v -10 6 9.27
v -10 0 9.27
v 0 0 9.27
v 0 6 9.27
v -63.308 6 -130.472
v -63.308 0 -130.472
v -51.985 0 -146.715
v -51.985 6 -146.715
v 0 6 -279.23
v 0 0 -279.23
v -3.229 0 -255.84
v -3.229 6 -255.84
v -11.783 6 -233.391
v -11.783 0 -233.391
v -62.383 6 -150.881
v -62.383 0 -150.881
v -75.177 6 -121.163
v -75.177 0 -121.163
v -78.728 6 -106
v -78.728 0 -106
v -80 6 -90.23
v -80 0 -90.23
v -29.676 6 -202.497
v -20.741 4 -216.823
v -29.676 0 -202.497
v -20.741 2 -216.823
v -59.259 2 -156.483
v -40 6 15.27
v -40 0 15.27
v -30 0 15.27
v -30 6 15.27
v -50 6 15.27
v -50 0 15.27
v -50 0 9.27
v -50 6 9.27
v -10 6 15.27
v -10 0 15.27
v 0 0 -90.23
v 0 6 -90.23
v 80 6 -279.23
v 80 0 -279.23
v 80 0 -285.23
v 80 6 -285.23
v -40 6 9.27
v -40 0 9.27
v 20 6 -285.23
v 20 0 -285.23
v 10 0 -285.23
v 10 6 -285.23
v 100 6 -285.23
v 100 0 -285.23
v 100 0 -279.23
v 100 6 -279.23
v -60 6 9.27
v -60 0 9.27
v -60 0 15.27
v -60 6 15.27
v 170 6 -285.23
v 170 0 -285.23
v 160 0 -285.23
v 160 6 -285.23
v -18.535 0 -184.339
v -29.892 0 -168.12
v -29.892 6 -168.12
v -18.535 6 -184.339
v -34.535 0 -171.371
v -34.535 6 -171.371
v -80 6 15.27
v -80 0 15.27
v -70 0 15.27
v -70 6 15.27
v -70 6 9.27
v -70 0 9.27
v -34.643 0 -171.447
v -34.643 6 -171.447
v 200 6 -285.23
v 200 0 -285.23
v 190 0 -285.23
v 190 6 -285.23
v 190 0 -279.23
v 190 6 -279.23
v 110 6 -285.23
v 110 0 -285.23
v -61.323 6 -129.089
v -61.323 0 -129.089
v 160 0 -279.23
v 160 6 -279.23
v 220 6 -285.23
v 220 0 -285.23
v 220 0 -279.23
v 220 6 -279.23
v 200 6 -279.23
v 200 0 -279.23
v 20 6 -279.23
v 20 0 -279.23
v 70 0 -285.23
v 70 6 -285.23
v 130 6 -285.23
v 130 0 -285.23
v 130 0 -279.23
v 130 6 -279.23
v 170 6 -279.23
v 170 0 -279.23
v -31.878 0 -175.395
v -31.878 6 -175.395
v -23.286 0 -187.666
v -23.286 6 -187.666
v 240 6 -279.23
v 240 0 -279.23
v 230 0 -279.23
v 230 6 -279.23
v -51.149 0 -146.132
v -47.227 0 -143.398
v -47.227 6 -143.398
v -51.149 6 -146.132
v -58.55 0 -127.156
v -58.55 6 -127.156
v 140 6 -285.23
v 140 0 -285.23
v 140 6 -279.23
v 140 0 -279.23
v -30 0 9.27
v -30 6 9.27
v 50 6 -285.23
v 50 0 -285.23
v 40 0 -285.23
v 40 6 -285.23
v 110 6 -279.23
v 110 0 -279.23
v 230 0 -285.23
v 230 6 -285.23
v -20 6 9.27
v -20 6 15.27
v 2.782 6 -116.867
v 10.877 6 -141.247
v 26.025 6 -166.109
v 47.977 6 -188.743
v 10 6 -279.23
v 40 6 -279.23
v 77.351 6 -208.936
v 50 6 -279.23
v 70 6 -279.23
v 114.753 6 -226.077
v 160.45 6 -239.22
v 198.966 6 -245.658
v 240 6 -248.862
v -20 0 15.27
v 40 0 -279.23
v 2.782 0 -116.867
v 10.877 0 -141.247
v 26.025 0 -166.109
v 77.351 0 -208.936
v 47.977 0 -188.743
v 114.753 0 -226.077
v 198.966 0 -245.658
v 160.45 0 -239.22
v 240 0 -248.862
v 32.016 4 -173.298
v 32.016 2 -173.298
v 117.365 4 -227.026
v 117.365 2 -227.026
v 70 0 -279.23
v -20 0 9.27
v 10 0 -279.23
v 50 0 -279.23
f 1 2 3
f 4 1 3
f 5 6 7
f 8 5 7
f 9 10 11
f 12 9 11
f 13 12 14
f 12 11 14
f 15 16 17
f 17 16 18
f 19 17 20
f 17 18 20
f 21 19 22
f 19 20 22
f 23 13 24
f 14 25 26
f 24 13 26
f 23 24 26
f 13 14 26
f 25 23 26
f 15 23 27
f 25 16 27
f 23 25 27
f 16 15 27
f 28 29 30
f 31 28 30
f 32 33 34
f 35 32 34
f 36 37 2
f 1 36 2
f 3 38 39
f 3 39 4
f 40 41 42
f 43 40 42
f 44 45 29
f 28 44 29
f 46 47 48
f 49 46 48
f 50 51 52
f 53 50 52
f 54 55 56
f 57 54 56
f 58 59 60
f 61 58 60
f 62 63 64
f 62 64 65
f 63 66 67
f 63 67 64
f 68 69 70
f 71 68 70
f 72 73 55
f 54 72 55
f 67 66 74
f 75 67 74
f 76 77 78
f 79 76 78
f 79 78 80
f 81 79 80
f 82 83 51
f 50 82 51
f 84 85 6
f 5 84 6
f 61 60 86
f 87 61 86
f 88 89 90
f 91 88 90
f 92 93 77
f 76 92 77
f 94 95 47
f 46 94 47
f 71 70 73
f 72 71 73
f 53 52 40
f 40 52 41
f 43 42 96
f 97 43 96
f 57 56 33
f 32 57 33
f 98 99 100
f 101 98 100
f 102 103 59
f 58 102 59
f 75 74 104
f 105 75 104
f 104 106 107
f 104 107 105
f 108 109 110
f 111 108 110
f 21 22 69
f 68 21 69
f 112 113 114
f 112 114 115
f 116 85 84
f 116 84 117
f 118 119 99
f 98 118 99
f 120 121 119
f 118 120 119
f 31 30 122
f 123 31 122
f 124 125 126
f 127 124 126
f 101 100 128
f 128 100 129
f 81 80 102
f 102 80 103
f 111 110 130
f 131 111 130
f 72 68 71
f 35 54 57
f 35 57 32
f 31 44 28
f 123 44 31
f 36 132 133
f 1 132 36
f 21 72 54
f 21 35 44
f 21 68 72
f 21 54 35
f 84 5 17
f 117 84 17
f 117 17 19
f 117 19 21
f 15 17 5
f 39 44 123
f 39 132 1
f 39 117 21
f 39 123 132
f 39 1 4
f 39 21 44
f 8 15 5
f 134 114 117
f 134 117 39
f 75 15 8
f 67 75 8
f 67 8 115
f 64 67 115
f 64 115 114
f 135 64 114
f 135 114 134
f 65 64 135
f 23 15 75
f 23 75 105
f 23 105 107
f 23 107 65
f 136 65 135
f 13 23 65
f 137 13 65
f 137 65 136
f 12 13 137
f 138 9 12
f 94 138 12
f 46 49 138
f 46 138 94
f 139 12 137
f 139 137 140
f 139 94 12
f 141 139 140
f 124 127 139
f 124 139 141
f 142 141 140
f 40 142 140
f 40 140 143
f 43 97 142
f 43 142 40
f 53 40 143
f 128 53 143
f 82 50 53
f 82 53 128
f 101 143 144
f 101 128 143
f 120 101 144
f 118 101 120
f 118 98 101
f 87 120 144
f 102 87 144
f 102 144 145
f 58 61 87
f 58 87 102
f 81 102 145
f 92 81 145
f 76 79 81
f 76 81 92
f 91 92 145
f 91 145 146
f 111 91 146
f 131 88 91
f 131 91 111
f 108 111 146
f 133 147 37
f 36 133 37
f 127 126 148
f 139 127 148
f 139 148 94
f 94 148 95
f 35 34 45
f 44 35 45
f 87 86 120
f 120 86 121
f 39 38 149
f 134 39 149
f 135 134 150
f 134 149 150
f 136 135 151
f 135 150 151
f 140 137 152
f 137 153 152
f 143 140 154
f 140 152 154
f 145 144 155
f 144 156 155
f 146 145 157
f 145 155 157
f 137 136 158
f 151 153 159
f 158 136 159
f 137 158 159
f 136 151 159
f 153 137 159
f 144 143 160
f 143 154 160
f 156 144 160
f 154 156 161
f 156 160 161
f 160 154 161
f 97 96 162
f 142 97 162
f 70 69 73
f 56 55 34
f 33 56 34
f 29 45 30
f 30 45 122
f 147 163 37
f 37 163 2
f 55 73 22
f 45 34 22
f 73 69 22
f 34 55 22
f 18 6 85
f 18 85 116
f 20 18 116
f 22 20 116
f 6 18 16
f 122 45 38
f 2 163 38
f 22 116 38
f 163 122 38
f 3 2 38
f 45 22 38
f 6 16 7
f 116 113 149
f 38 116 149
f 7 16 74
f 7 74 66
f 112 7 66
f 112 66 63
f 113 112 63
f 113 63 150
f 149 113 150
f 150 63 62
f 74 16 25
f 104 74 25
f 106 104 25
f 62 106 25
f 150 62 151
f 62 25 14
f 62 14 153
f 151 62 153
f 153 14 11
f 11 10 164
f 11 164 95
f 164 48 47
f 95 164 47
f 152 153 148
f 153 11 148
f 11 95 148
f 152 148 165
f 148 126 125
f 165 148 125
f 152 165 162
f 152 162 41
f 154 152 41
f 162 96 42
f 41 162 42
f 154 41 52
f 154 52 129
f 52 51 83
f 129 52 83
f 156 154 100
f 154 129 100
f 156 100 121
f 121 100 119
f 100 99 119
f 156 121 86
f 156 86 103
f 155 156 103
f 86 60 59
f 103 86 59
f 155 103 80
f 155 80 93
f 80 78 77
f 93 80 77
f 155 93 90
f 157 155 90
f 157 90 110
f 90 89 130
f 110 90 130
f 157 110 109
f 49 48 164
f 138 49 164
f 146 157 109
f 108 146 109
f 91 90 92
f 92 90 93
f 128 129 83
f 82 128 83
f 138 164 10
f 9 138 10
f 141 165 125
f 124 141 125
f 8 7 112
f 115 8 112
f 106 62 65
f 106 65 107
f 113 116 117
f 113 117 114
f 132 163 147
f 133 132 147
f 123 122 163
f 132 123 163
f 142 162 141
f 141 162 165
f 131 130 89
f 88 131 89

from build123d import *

# Parameters (mm, degrees)
BOSS_EXTRUDE1_DEPTH = 6
SKETCH2_W           = 10
SKETCH2_H           = 6
BOSS_EXTRUDE2_DEPTH = 6
SKETCH3_W           = 10
SKETCH3_H           = 6
BOSS_EXTRUDE3_DEPTH = 6
SKETCH4_W           = 20
SKETCH4_H           = 30.367424907
CUT_EXTRUDE1_DEPTH  = 6
CUT_EXTRUDE2_DEPTH  = 355.990492973
FLEX1_DEPTH         = 6
FLEX1_2_DEPTH       = 6


# Read off the part's stored shape, not the designer's step: Flex1
with BuildPart() as part:
    # Sketch1 → Boss-Extrude1 (new body)
    with BuildSketch(Plane(origin=(0, 0, 0), x_dir=(1, 0, 0), z_dir=(0, 1, 0))):
        with BuildLine():
            Line((0, 0), (0, 66.5))
            add(Edge.make_bspline(
                [(0, 66.5), (0, 168.087947667), (114.415275211, 225.5), (260, 225.5)],
                knots=[0, 0, 0, 0, 1, 1, 1, 1], degree=3))
            Line((260, 225.5), (260, 255.5))
            Line((260, 255.5), (0, 255.5))
            add(Edge.make_bspline(
                [(-80, 66.5), (-80, 138.367791909), (0, 189.401588521), (0, 255.5)],
                knots=[0, 0, 0, 0, 1, 1, 1, 1], degree=3))
            Line((-80, 66.5), (-80, 0))
            Line((-80, 0), (0, 0))
        make_face()
    extrude(amount=BOSS_EXTRUDE1_DEPTH)

    # Sketch2 → Boss-Extrude2 (add)
    with BuildSketch(Plane(origin=(0, 6, 0), x_dir=(1, 0, 0), z_dir=(0, 1, 0))):
        with Locations((-35, -3)):
            Rectangle(SKETCH2_W, SKETCH2_H)
        with Locations((-15, -3)):
            Rectangle(SKETCH2_W, SKETCH2_H)
        with Locations((-55, -3)):
            Rectangle(SKETCH2_W, SKETCH2_H)
        with Locations((-75, -3)):
            Rectangle(SKETCH2_W, SKETCH2_H)
    extrude(amount=-BOSS_EXTRUDE2_DEPTH)

    # Sketch3 → Boss-Extrude3 (add)
    with BuildSketch(Plane(origin=(0, 6, 0), x_dir=(1, 0, 0), z_dir=(0, 1, 0))):
        with Locations((195, 258.5)):
            Rectangle(SKETCH3_W, SKETCH3_H)
        with Locations((225, 258.5)):
            Rectangle(SKETCH3_W, SKETCH3_H)
        with Locations((165, 258.5)):
            Rectangle(SKETCH3_W, SKETCH3_H)
        with Locations((135, 258.5)):
            Rectangle(SKETCH3_W, SKETCH3_H)
        with Locations((105, 258.5)):
            Rectangle(SKETCH3_W, SKETCH3_H)
        with Locations((75, 258.5)):
            Rectangle(SKETCH3_W, SKETCH3_H)
        with Locations((45, 258.5)):
            Rectangle(SKETCH3_W, SKETCH3_H)
        with Locations((15, 258.5)):
            Rectangle(SKETCH3_W, SKETCH3_H)
    extrude(amount=-BOSS_EXTRUDE3_DEPTH)

    # Sketch4 → Cut-Extrude1 (cut)
    with BuildSketch(Plane(origin=(0, 6, 0), x_dir=(1, 0, 0), z_dir=(0, 1, 0))):
        with Locations((250, 240.316287547)):
            Rectangle(SKETCH4_W, SKETCH4_H)
    extrude(amount=-CUT_EXTRUDE1_DEPTH, mode=Mode.SUBTRACT)

    # Sketch5 → Cut-Extrude2 (cut, through all)
    with BuildSketch(Plane(origin=(0, 6, 0), x_dir=(1, 0, 0), z_dir=(0, 1, 0))):
        Polygon((-29.891687561, 144.39007032), (-34.642769417, 147.71681365), (-23.285955978, 163.936024127), (-18.534874121, 160.609280796), align=None)
        Polygon((-58.550195169, 103.425626242), (-63.308179345, 106.742490211), (-51.985092004, 122.985263776), (-47.227107828, 119.668399807), align=None)
    extrude(amount=-CUT_EXTRUDE2_DEPTH, mode=Mode.SUBTRACT)

    # Flex1 outline → Flex1 (cut)
    with BuildSketch(Plane(origin=(0, 0, 0), x_dir=(1, 0, 0), z_dir=(0, 1, 0))):
        with BuildLine():
            add(Edge.make_bspline(
                [(0, 90.229900389), (0, 187.117415556), (104.072328665, 243.822461296), (240.00000001, 248.862475483)],
                knots=[0, 0, 0, 0, 0.953730412, 0.953730412, 0.953730412, 0.953730412], degree=3))
            Line((0, 90.229900389), (0, 66.5))
            add(Edge.make_bspline(
                [(0, 66.5), (0, 163.387515167), (104.072328665, 220.092560907), (240.00000001, 225.132575093)],
                knots=[0, 0, 0, 0, 0.953730412, 0.953730412, 0.953730412, 0.953730412], degree=3))
            Line((240.00000001, 225.132575093), (240.00000001, 248.862475483))
        make_face()
        with BuildLine():
            add(Edge.make_bspline(
                [(-51.148803226, 146.132174392), (-54.710438553, 140.513781755), (-58.143911828, 134.842056067), (-61.323392575, 129.088765208)],
                knots=[0.594014657, 0.594014657, 0.594014657, 0.594014657, 0.686318961, 0.686318961, 0.686318961, 0.686318961], degree=3))
            Line((-61.323392575, 129.088765208), (-58.550195169, 127.155526632))
            Line((-58.550195169, 127.155526632), (-47.227107828, 143.398300196))
            Line((-47.227107828, 143.398300196), (-51.148803226, 146.132174392))
        make_face()
        with BuildLine():
            add(Edge.make_bspline(
                [(-31.878447999, 175.394574164), (-32.758957733, 174.05373382), (-33.644948776, 172.71267215), (-34.534615872, 171.370984112)],
                knots=[0.431899292, 0.431899292, 0.431899292, 0.431899292, 0.454328108, 0.454328108, 0.454328108, 0.454328108], degree=3))
            Line((-34.534615872, 171.370984112), (-29.891687561, 168.119970709))
            Line((-29.891687561, 168.119970709), (-18.534874121, 184.339181186))
            Line((-18.534874121, 184.339181186), (-23.285955978, 187.665924517))
            Line((-23.285955978, 187.665924517), (-31.878447999, 175.394574164))
        make_face()
    extrude(amount=FLEX1_DEPTH, mode=Mode.SUBTRACT)

    # Flex1 2 outline → Flex1 2 (add)
    with BuildSketch(Plane(origin=(0, 0, 0), x_dir=(1, 0, 0), z_dir=(0, 1, 0))):
        with BuildLine():
            Line((230, 255.5), (240, 255.5))
            Line((240, 255.5), (240, 279.229900389))
            Line((240, 279.229900389), (230, 279.229900389))
            Line((230, 279.229900389), (230, 285.229900389))
            Line((230, 285.229900389), (220, 285.229900389))
            Line((220, 285.229900389), (220, 279.229900389))
            Line((220, 279.229900389), (200, 279.229900389))
            Line((200, 279.229900389), (200, 285.229900389))
            Line((200, 285.229900389), (190, 285.229900389))
            Line((190, 285.229900389), (190, 279.229900389))
            Line((190, 279.229900389), (170, 279.229900389))
            Line((170, 279.229900389), (170, 285.229900389))
            Line((170, 285.229900389), (160, 285.229900389))
            Line((160, 285.229900389), (160, 279.229900389))
            Line((160, 279.229900389), (140, 279.229900389))
            Line((140, 279.229900389), (140, 285.229900389))
            Line((140, 285.229900389), (130, 285.229900389))
            Line((130, 285.229900389), (130, 279.229900389))
            Line((130, 279.229900389), (110, 279.229900389))
            Line((110, 279.229900389), (110, 285.229900389))
            Line((110, 285.229900389), (100, 285.229900389))
            Line((100, 285.229900389), (100, 279.229900389))
            Line((100, 279.229900389), (80, 279.229900389))
            Line((80, 279.229900389), (80, 285.229900389))
            Line((80, 285.229900389), (70, 285.229900389))
            Line((70, 285.229900389), (70, 279.229900389))
            Line((70, 279.229900389), (50, 279.229900389))
            Line((50, 279.229900389), (50, 285.229900389))
            Line((50, 285.229900389), (40, 285.229900389))
            Line((40, 285.229900389), (40, 279.229900389))
            Line((40, 279.229900389), (20, 279.229900389))
            Line((20, 279.229900389), (20, 285.229900389))
            Line((20, 285.229900389), (10, 285.229900389))
            Line((10, 285.229900389), (10, 279.229900389))
            Line((10, 279.229900389), (0, 279.229900389))
            add(Edge.make_bspline(
                [(0, 279.229900389), (0, 213.131488911), (-80, 162.097692299), (-80, 90.229900389)],
                knots=[0, 0, 0, 0, 1, 1, 1, 1], degree=3))
            Line((-80, 90.229900389), (-80, 66.5))
            add(Edge.make_bspline(
                [(-61.323392575, 129.088765208), (-72.12833646, 109.537149765), (-80, 89.04356364), (-80, 66.5)],
                knots=[0.686318961, 0.686318961, 0.686318961, 0.686318961, 1, 1, 1, 1], degree=3))
            Line((-61.323392575, 129.088765208), (-63.308179345, 130.4723906))
            Line((-63.308179345, 130.4723906), (-51.985092004, 146.715164165))
            Line((-51.985092004, 146.715164165), (-51.148803226, 146.132174392))
            add(Edge.make_bspline(
                [(-34.534615872, 171.370984112), (-40.075457788, 163.01495819), (-45.758886122, 154.634636824), (-51.148803226, 146.132174392)],
                knots=[0.454328108, 0.454328108, 0.454328108, 0.454328108, 0.594014657, 0.594014657, 0.594014657, 0.594014657], degree=3))
            Line((-34.534615872, 171.370984112), (-34.642769417, 171.44671404))
            Line((-34.642769417, 171.44671404), (-31.878447999, 175.394574164))
            add(Edge.make_bspline(
                [(0, 255.5), (0, 226.952142889), (-14.922959865, 201.214393816), (-31.878447999, 175.394574164)],
                knots=[0, 0, 0, 0, 0.431899292, 0.431899292, 0.431899292, 0.431899292], degree=3))
            Line((0, 255.5), (10, 255.5))
            Line((10, 255.5), (10, 261.5))
            Line((10, 261.5), (20, 261.5))
            Line((20, 261.5), (20, 255.5))
            Line((20, 255.5), (40, 255.5))
            Line((40, 255.5), (40, 261.5))
            Line((40, 261.5), (50, 261.5))
            Line((50, 261.5), (50, 255.5))
            Line((50, 255.5), (70, 255.5))
            Line((70, 255.5), (70, 261.5))
            Line((70, 261.5), (80, 261.5))
            Line((80, 261.5), (80, 255.5))
            Line((80, 255.5), (100, 255.5))
            Line((100, 255.5), (100, 261.5))
            Line((100, 261.5), (110, 261.5))
            Line((110, 261.5), (110, 255.5))
            Line((110, 255.5), (130, 255.5))
            Line((130, 255.5), (130, 261.5))
            Line((130, 261.5), (140, 261.5))
            Line((140, 261.5), (140, 255.5))
            Line((140, 255.5), (160, 255.5))
            Line((160, 255.5), (160, 261.5))
            Line((160, 261.5), (170, 261.5))
            Line((170, 261.5), (170, 255.5))
            Line((170, 255.5), (190, 255.5))
            Line((190, 255.5), (190, 261.5))
            Line((190, 261.5), (200, 261.5))
            Line((200, 261.5), (200, 255.5))
            Line((200, 255.5), (220, 255.5))
            Line((220, 255.5), (220, 261.5))
            Line((220, 261.5), (230, 261.5))
            Line((230, 261.5), (230, 255.5))
        make_face()
        Polygon((0, -9.270099611), (0, 0), (-10, 0), (-10, -6), (-20, -6), (-20, 0), (-30, 0), (-30, -6), (-40, -6), (-40, 0), (-50, 0), (-50, -6), (-60, -6), (-60, 0), (-70, 0), (-70, -6), (-80, -6), (-80, -15.270099611), (-70, -15.270099611), (-70, -9.270099611), (-60, -9.270099611), (-60, -15.270099611), (-50, -15.270099611), (-50, -9.270099611), (-40, -9.270099611), (-40, -15.270099611), (-30, -15.270099611), (-30, -9.270099611), (-20, -9.270099611), (-20, -15.270099611), (-10, -15.270099611), (-10, -9.270099611), align=None)
        Polygon((-63.308179345, 106.742490211), (-58.550195169, 103.425626242), (-47.227107828, 119.668399807), (-51.985092004, 122.985263776), align=None)
        Polygon((-34.642769417, 147.71681365), (-29.891687561, 144.39007032), (-18.534874121, 160.609280796), (-23.285955978, 163.936024127), align=None)
    extrude(amount=FLEX1_2_DEPTH)


solid = part.part
